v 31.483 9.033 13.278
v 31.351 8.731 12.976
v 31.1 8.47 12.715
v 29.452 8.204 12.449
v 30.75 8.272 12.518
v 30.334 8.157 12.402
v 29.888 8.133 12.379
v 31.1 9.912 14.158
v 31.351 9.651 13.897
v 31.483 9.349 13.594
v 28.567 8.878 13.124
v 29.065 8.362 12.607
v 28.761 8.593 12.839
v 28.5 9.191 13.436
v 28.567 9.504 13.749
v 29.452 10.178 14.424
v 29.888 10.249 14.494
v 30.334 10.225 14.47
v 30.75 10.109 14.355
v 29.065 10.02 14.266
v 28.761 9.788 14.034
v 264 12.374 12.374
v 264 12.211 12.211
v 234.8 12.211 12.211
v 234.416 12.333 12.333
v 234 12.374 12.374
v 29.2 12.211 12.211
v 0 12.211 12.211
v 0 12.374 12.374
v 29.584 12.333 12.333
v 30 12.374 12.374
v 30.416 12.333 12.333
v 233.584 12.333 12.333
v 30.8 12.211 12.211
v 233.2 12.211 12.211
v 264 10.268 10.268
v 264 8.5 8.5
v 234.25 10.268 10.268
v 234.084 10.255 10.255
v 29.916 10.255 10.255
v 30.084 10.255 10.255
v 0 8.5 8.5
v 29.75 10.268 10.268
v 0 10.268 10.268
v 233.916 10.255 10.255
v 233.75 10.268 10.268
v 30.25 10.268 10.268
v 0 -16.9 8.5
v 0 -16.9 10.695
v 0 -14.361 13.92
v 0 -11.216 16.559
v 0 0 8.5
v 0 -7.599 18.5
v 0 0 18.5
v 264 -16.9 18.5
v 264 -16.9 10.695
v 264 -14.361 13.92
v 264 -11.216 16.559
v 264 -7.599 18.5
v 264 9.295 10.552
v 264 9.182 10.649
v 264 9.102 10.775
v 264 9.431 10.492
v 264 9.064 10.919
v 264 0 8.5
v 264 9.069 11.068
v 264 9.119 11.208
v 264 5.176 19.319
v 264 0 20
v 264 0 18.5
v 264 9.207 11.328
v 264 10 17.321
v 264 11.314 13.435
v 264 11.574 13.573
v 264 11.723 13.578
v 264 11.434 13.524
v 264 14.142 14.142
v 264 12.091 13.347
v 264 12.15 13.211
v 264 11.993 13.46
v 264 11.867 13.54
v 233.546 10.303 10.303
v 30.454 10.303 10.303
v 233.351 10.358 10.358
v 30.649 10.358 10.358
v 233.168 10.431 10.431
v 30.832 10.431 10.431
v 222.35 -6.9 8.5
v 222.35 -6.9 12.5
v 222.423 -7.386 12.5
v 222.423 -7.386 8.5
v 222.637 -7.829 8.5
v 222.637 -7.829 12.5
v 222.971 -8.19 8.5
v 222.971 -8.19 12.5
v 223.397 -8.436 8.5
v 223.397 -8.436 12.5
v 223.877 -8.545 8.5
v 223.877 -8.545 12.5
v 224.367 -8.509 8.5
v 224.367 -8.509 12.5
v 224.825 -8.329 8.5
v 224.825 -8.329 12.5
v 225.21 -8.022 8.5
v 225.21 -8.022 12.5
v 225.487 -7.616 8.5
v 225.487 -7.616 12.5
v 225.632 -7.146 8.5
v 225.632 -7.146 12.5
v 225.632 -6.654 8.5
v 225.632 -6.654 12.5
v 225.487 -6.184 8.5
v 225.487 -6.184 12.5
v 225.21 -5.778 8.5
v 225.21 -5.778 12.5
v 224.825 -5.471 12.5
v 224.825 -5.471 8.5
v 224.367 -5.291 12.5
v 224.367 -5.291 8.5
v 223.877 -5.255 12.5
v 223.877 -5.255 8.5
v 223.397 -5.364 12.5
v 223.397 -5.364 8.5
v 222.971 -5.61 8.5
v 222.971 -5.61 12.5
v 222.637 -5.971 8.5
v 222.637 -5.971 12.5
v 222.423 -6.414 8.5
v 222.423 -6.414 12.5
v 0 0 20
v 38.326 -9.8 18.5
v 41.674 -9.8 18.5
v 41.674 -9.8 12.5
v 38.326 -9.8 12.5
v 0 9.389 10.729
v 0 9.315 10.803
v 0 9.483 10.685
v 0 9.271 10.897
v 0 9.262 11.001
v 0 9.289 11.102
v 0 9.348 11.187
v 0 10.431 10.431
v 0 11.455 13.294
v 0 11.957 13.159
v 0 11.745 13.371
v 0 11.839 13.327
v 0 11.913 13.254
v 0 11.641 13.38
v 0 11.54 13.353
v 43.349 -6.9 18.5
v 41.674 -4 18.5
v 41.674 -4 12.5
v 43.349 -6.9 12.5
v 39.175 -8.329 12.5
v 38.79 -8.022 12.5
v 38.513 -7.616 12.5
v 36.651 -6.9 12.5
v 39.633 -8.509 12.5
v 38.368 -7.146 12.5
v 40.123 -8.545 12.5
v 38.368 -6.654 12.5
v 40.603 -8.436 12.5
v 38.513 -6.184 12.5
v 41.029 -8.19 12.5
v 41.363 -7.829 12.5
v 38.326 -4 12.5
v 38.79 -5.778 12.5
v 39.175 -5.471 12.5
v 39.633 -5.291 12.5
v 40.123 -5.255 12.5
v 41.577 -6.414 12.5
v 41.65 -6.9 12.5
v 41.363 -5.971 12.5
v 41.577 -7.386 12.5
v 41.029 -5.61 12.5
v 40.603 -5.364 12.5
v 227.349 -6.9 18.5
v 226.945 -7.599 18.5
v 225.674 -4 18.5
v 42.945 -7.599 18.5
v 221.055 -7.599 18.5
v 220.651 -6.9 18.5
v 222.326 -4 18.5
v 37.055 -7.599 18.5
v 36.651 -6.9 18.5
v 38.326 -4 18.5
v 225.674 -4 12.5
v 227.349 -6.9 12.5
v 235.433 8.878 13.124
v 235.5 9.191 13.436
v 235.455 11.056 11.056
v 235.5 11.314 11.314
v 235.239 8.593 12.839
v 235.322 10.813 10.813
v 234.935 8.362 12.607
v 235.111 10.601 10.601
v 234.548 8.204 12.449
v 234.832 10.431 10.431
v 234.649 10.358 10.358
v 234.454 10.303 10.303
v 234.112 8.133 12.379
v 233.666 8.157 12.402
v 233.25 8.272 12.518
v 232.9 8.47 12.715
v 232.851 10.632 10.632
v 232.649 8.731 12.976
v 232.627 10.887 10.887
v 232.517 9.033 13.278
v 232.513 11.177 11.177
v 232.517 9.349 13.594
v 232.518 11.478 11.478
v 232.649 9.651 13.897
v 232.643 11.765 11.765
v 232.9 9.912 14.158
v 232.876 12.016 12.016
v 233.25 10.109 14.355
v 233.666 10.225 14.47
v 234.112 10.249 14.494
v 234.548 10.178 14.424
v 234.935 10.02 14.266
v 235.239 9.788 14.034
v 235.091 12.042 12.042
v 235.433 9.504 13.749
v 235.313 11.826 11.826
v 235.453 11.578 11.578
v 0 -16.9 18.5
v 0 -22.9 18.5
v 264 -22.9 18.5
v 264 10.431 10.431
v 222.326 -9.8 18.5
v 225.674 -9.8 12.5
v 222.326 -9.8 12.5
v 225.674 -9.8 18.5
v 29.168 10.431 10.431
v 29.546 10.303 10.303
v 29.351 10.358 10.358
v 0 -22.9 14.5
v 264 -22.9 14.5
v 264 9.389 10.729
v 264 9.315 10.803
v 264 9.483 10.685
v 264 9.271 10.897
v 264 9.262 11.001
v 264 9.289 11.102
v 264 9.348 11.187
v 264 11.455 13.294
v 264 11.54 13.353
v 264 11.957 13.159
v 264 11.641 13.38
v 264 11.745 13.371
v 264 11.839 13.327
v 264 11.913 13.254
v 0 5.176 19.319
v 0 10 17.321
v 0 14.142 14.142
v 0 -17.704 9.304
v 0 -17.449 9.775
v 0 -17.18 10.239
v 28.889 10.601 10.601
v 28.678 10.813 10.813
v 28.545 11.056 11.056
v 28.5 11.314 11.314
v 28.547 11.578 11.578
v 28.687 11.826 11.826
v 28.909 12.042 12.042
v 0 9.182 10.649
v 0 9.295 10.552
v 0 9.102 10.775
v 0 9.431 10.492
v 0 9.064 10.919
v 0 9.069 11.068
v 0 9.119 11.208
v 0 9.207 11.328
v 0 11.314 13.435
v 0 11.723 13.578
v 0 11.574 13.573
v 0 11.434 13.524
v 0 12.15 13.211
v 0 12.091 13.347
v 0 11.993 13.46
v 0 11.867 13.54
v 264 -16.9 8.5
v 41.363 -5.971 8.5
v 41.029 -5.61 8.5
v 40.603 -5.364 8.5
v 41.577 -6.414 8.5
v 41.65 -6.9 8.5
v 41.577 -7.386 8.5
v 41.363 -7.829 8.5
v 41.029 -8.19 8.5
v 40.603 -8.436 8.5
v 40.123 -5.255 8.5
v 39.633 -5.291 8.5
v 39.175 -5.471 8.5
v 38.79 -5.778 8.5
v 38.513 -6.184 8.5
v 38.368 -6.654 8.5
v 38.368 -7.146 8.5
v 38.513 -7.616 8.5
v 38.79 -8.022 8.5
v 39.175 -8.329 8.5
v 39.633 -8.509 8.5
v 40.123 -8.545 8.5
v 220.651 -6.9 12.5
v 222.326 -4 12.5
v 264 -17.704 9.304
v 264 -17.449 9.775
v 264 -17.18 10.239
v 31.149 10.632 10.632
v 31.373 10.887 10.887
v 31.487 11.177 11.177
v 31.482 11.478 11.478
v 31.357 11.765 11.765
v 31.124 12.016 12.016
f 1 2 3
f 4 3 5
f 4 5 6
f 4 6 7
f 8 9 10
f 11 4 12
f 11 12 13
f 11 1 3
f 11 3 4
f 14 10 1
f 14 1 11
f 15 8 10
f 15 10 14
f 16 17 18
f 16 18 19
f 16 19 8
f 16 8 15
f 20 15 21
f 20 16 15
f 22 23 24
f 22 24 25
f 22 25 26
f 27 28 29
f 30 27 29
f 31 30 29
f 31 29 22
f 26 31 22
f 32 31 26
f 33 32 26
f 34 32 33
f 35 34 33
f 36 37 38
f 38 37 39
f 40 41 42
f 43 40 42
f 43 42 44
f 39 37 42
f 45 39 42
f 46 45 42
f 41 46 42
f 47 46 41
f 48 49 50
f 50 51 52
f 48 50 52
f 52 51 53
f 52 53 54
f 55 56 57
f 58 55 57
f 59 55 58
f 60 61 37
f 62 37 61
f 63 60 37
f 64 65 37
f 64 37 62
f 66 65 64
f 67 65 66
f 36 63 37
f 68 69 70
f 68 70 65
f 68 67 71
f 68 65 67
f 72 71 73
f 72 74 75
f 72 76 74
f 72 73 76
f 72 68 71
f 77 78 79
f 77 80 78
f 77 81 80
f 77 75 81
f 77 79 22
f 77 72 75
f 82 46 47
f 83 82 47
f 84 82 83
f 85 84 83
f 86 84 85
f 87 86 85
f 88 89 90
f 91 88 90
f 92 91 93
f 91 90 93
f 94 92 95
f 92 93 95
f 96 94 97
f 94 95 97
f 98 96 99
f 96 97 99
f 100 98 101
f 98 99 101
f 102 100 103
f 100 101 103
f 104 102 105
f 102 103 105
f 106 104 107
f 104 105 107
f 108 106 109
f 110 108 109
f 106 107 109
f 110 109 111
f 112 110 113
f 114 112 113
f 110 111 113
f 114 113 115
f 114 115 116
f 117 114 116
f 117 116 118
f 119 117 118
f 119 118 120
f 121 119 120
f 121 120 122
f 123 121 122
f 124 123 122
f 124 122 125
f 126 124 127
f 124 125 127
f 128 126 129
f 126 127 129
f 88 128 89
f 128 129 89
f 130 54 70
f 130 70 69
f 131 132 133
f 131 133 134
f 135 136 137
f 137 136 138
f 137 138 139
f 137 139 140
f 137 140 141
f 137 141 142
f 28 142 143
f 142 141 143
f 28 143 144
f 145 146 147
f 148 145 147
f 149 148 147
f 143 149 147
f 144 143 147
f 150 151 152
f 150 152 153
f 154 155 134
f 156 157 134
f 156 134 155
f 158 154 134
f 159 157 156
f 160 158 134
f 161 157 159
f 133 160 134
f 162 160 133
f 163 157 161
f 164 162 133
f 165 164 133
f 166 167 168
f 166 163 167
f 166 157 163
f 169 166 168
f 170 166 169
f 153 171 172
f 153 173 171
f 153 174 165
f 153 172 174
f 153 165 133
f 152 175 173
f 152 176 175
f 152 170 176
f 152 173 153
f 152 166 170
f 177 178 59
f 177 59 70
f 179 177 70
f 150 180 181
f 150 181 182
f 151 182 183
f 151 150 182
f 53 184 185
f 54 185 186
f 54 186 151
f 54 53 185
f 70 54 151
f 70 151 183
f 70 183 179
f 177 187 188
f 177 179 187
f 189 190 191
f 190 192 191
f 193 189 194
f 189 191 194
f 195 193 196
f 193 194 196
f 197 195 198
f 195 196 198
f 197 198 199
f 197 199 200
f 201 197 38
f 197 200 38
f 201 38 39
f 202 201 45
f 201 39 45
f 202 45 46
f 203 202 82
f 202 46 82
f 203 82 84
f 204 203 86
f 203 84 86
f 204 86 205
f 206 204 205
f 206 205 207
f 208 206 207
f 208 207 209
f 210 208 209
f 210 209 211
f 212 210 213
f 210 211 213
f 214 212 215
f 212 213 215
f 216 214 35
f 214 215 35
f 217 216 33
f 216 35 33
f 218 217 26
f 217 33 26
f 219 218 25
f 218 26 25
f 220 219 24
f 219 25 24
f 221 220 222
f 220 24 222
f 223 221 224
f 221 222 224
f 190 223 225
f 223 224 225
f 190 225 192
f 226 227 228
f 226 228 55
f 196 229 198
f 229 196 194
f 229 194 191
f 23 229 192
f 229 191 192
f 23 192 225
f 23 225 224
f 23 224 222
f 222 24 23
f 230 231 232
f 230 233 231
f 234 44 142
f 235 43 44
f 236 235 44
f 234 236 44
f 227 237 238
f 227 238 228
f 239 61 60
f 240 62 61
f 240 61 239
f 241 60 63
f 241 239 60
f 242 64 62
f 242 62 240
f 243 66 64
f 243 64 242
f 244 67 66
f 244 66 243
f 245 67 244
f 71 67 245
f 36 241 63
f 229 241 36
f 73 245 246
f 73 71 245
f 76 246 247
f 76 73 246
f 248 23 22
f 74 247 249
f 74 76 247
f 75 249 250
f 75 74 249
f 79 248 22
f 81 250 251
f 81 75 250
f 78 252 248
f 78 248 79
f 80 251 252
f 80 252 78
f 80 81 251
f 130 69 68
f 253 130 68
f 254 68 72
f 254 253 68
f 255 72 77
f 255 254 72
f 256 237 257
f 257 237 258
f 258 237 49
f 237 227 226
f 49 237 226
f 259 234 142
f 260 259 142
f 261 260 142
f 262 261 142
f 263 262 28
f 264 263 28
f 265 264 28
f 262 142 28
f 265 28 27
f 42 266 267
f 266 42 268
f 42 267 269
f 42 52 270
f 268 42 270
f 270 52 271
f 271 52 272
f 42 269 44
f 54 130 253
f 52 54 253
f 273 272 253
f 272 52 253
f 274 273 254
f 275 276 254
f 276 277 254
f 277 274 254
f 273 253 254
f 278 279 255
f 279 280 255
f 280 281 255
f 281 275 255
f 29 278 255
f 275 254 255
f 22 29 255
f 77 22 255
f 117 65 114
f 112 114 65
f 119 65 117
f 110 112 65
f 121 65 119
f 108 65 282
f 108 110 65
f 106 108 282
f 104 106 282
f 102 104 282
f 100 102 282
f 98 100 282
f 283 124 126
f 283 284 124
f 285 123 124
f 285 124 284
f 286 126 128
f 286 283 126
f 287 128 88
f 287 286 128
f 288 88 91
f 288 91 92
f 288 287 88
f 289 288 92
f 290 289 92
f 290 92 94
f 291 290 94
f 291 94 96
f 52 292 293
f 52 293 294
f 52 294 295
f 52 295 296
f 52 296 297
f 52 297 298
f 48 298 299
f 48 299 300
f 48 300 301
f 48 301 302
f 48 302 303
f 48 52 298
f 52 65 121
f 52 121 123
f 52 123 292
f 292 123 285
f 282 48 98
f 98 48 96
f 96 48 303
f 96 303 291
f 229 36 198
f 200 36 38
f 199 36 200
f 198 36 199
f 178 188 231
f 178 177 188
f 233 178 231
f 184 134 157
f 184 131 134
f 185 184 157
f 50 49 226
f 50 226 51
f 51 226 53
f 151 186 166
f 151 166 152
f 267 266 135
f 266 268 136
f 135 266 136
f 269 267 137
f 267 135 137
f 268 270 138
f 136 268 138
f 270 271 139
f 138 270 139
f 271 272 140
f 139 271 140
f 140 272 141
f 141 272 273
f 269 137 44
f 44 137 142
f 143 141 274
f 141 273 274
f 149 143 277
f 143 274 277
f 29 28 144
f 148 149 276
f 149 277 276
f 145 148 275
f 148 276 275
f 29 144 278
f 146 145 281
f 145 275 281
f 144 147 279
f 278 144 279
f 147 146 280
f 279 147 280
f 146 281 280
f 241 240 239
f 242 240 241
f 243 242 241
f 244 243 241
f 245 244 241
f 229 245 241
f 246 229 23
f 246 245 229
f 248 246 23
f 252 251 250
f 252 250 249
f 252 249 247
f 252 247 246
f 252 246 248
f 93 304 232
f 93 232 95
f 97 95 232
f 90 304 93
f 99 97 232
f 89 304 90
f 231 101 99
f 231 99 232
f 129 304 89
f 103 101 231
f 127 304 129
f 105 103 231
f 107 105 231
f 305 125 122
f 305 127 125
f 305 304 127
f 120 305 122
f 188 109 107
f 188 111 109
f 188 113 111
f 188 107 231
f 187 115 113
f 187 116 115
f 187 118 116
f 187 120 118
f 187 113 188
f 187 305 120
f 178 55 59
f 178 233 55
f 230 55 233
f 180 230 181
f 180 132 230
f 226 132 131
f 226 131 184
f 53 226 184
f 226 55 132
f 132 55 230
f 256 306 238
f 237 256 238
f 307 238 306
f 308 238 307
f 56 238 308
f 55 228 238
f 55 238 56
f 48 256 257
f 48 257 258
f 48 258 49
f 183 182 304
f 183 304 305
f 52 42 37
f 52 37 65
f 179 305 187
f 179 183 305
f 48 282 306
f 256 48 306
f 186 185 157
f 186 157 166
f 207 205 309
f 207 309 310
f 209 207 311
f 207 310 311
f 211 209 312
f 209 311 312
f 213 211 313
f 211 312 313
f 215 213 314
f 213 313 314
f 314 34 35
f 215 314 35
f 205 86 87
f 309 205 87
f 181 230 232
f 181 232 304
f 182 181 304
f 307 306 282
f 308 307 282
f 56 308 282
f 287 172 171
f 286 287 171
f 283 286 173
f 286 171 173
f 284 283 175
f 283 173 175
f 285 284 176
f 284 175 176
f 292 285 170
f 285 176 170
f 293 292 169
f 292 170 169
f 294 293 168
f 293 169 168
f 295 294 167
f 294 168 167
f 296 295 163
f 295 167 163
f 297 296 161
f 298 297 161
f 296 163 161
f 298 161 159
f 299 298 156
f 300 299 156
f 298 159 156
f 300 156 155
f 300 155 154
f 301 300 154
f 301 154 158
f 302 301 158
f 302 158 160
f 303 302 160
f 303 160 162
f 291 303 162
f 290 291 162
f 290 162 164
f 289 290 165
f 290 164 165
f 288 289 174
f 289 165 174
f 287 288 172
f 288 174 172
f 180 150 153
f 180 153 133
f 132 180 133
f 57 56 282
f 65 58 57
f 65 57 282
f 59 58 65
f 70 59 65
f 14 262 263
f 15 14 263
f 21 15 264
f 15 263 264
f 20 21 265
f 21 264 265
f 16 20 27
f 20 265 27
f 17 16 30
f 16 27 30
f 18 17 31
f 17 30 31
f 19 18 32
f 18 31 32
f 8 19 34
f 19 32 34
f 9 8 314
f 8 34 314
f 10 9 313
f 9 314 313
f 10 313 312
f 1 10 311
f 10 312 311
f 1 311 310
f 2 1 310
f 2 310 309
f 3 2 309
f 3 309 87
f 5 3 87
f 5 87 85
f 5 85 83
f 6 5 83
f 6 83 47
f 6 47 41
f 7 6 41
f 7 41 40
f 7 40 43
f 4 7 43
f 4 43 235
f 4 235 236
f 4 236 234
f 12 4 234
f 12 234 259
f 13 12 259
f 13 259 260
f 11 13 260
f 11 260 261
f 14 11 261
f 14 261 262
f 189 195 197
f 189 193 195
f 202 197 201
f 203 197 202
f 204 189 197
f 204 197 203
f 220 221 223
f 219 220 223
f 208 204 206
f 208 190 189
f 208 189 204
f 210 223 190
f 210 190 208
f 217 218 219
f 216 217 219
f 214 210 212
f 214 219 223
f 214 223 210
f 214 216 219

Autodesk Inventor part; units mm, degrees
ref_plane "YZ Plane" through (0, 0, 0) normal (1, 0, 0) x (0, 1, 0)
ref_plane "XZ Plane" through (0, 0, 0) normal (0, 1, 0) x (-1, 0, 0)
ref_plane "XY Plane" through (0, 0, 0) normal (0, 0, 1) x (1, 0, 0)
sketch "Sketch1" plane through (0, 0, 0) normal (1, 0, 0) x (0, 1, 0)
  circle A0 centre (0, 0) radius 20
  line L0 (8.5, 8.5) -> (-16.9, 8.5)
  line L1 (8.5, 8.5) -> (8.5, -16.9)
  line L2 (0, 0) -> (0, 20)
  line L3 (0, 20) -> (-60.9241, 20)
  line L4 (-60.9241, 20) -> (-60.9241, 18.5)
  line L5 (-60.9241, 18.5) -> (0, 18.5)
  line L6 (0, 18.5) -> (0, 20)
  line L7 (0, 0) -> (14.1421, 14.1421)
  line L8 (0, 0) -> (20, 0)
  line L9 (-16.9, 8.5) -> (-16.9, 18.5)
  line L10 (-16.9, 8.5) -> (-22.9, 14.5)
  line L11 (-22.9, 14.5) -> (-22.9, 18.5)
  line L12 (12.3744, 12.3744) -> (12.1502, 13.2109)
  line L13 (11.3137, 13.435) -> (9.2071, 11.3284)
  line L14 (9.4313, 10.4919) -> (10.2678, 10.2678)
  line L15 (8.5, 8.5) -> (8.5, -16.9)
  line L16 (20, 0) -> (20, -60.9241)
  line L17 (20, -60.9241) -> (18.5, -60.9241)
  line L18 (18.5, -60.9241) -> (18.5, 0)
  line L19 (8.5, -16.9) -> (18.5, -16.9)
  line L20 (8.5, -16.9) -> (14.5, -22.9)
  line L21 (14.5, -22.9) -> (18.5, -22.9)
  arc A1 (9.2071, 11.3284) -> (9.4313, 10.4919) centre (9.5607, 10.9749) ccw
  arc A2 (12.1502, 13.2109) -> (11.3137, 13.435) centre (11.6673, 13.0815) ccw
  line L22 (10.4311, 10.4311) -> (9.483, 10.6851)
  arc A3 (9.3485, 11.187) -> (9.483, 10.6851) centre (9.5607, 10.9749) ccw
  line L23 (9.3485, 11.187) -> (11.4551, 13.2936)
  arc A4 (11.957, 13.1591) -> (11.4551, 13.2936) centre (11.6673, 13.0815) ccw
  line L24 (11.957, 13.1591) -> (12.2111, 12.2111)
  point P0 (0, 8.5)
  point P1 (-17.7041, 9.3041)
  point P2 (-16.9, 10.6953)
  dimension "d0" = 40
  dimension "d1" = 25.4
  dimension "d2" = 1.5
  dimension "d4" = 45
  dimension "d6" = 45
  dimension "d7" = 4
  dimension "d8" = 10
  dimension "d10" = 2.5
  dimension "d11" = 2.5
  dimension "d12" = 60
  dimension "d13" = 1.5
  dimension "d15" = 0.5
  dimension "d16" = 0.2
extrude "Extrusion1" add sketch "Sketch1" along normal blind 264 contours L7 L12 A2 L13 A1 L14 L0 L2 A0 | L7 L24 A4 L23 A3 L22 L14 A1 L13 A2 L12 | L5 L2 L0 L9 A0 | A0 L9 L5 | L7 L22 A3 L23 A4 L24 | L9 L10 A0 | A0 L10 L11 L5 L9
sketch "Sketch2" plane through (0, -22.9, 18.5) normal (0, 0, 1) x (1, 0, 0)
  line L0 (0, 22.9) -> (0, 0) projected
  line L1 (0, 0) -> (264, 0) projected
  line L2 (264, 22.9) -> (264, 0) projected
  line L3 (0, 22.9) -> (264, 22.9) projected
  line L4 (38.3257, 13.1) -> (36.6514, 16)
  line L5 (36.6514, 16) -> (38.3257, 18.9)
  line L6 (38.3257, 18.9) -> (41.6743, 18.9)
  line L7 (41.6743, 18.9) -> (43.3486, 16)
  line L8 (43.3486, 16) -> (41.6743, 13.1)
  line L9 (41.6743, 13.1) -> (38.3257, 13.1)
  line L10 (0, 6) -> (264, 6) projected
  circle A0 centre (40, 16) radius 1.65
  dimension "d20" = 10
  dimension "d21" = 5.8
  dimension "d22" = 40
  dimension "d25" = 3.3
extrude "Extrusion2" cut sketch "Sketch2" against normal blind 6 contours L4 L5 L6 L7 L8 L9 | A0
extrude "Extrusion3" cut sketch "Sketch2" against normal through all contours A0
sketch "Sketch3" plane through (0, -22.9, 18.5) normal (0, 0, 1) x (1, 0, 0)
  line L0 (0, 37.0421) -> (264, 37.0421) projected
  line L1 (0, 0) -> (264, 0) projected
  line L2 (0, 22.9) -> (0, 0) projected
  line L3 (0, 22.9) -> (0, 37.0421) projected
  line L4 (2.4384, 37.0421) -> (17.8575, 0)
  line L5 (0, 0) -> (264, 0) projected
  line L6 (2.4384, 37.0421) -> (0, 42.9) projected
  point P0 (0, 26.9698)
  dimension "d28" = 112.6
sketch "Sketch4" plane through (264, 14.1421, 14.1421) normal (0, 0.7071, -0.7071) x (-1, 0, 0)
  line L0 (264, 0) -> (0, 0) projected
  line L1 (0, -7.9792) -> (0, 0) projected
  line L2 (264, -7.9792) -> (0, -7.9792) projected
  circle A0 centre (234, -4) radius 1.5
  line L3 (264, -7.9792) -> (264, 0) projected
  line L4 (132, -7.9792) -> (132, 0)
  ellipse E0 centre (224, -18.8686) end of major axis (222.35, -18.8686) minor radius 1.1667 projected
  point P0 (264, -20)
  dimension "d34" = 3
  dimension "d35" = 4
  dimension "d46" = 30
extrude "Extrusion5" cut sketch "Sketch4" against normal blind 3 contours A0
ref_plane "Work Plane1" through (132, 0, 0) normal (-1, 0, 0) x (0, 0, 1)
mirror "Mirror1" about plane through (132, 0, 0) normal (-1, 0, 0) of "Extrusion5", "Extrusion2", "Extrusion3"
properties part number "ESQUINA_REDONDEADA_R20" material "Steel, Mild, Welded"
